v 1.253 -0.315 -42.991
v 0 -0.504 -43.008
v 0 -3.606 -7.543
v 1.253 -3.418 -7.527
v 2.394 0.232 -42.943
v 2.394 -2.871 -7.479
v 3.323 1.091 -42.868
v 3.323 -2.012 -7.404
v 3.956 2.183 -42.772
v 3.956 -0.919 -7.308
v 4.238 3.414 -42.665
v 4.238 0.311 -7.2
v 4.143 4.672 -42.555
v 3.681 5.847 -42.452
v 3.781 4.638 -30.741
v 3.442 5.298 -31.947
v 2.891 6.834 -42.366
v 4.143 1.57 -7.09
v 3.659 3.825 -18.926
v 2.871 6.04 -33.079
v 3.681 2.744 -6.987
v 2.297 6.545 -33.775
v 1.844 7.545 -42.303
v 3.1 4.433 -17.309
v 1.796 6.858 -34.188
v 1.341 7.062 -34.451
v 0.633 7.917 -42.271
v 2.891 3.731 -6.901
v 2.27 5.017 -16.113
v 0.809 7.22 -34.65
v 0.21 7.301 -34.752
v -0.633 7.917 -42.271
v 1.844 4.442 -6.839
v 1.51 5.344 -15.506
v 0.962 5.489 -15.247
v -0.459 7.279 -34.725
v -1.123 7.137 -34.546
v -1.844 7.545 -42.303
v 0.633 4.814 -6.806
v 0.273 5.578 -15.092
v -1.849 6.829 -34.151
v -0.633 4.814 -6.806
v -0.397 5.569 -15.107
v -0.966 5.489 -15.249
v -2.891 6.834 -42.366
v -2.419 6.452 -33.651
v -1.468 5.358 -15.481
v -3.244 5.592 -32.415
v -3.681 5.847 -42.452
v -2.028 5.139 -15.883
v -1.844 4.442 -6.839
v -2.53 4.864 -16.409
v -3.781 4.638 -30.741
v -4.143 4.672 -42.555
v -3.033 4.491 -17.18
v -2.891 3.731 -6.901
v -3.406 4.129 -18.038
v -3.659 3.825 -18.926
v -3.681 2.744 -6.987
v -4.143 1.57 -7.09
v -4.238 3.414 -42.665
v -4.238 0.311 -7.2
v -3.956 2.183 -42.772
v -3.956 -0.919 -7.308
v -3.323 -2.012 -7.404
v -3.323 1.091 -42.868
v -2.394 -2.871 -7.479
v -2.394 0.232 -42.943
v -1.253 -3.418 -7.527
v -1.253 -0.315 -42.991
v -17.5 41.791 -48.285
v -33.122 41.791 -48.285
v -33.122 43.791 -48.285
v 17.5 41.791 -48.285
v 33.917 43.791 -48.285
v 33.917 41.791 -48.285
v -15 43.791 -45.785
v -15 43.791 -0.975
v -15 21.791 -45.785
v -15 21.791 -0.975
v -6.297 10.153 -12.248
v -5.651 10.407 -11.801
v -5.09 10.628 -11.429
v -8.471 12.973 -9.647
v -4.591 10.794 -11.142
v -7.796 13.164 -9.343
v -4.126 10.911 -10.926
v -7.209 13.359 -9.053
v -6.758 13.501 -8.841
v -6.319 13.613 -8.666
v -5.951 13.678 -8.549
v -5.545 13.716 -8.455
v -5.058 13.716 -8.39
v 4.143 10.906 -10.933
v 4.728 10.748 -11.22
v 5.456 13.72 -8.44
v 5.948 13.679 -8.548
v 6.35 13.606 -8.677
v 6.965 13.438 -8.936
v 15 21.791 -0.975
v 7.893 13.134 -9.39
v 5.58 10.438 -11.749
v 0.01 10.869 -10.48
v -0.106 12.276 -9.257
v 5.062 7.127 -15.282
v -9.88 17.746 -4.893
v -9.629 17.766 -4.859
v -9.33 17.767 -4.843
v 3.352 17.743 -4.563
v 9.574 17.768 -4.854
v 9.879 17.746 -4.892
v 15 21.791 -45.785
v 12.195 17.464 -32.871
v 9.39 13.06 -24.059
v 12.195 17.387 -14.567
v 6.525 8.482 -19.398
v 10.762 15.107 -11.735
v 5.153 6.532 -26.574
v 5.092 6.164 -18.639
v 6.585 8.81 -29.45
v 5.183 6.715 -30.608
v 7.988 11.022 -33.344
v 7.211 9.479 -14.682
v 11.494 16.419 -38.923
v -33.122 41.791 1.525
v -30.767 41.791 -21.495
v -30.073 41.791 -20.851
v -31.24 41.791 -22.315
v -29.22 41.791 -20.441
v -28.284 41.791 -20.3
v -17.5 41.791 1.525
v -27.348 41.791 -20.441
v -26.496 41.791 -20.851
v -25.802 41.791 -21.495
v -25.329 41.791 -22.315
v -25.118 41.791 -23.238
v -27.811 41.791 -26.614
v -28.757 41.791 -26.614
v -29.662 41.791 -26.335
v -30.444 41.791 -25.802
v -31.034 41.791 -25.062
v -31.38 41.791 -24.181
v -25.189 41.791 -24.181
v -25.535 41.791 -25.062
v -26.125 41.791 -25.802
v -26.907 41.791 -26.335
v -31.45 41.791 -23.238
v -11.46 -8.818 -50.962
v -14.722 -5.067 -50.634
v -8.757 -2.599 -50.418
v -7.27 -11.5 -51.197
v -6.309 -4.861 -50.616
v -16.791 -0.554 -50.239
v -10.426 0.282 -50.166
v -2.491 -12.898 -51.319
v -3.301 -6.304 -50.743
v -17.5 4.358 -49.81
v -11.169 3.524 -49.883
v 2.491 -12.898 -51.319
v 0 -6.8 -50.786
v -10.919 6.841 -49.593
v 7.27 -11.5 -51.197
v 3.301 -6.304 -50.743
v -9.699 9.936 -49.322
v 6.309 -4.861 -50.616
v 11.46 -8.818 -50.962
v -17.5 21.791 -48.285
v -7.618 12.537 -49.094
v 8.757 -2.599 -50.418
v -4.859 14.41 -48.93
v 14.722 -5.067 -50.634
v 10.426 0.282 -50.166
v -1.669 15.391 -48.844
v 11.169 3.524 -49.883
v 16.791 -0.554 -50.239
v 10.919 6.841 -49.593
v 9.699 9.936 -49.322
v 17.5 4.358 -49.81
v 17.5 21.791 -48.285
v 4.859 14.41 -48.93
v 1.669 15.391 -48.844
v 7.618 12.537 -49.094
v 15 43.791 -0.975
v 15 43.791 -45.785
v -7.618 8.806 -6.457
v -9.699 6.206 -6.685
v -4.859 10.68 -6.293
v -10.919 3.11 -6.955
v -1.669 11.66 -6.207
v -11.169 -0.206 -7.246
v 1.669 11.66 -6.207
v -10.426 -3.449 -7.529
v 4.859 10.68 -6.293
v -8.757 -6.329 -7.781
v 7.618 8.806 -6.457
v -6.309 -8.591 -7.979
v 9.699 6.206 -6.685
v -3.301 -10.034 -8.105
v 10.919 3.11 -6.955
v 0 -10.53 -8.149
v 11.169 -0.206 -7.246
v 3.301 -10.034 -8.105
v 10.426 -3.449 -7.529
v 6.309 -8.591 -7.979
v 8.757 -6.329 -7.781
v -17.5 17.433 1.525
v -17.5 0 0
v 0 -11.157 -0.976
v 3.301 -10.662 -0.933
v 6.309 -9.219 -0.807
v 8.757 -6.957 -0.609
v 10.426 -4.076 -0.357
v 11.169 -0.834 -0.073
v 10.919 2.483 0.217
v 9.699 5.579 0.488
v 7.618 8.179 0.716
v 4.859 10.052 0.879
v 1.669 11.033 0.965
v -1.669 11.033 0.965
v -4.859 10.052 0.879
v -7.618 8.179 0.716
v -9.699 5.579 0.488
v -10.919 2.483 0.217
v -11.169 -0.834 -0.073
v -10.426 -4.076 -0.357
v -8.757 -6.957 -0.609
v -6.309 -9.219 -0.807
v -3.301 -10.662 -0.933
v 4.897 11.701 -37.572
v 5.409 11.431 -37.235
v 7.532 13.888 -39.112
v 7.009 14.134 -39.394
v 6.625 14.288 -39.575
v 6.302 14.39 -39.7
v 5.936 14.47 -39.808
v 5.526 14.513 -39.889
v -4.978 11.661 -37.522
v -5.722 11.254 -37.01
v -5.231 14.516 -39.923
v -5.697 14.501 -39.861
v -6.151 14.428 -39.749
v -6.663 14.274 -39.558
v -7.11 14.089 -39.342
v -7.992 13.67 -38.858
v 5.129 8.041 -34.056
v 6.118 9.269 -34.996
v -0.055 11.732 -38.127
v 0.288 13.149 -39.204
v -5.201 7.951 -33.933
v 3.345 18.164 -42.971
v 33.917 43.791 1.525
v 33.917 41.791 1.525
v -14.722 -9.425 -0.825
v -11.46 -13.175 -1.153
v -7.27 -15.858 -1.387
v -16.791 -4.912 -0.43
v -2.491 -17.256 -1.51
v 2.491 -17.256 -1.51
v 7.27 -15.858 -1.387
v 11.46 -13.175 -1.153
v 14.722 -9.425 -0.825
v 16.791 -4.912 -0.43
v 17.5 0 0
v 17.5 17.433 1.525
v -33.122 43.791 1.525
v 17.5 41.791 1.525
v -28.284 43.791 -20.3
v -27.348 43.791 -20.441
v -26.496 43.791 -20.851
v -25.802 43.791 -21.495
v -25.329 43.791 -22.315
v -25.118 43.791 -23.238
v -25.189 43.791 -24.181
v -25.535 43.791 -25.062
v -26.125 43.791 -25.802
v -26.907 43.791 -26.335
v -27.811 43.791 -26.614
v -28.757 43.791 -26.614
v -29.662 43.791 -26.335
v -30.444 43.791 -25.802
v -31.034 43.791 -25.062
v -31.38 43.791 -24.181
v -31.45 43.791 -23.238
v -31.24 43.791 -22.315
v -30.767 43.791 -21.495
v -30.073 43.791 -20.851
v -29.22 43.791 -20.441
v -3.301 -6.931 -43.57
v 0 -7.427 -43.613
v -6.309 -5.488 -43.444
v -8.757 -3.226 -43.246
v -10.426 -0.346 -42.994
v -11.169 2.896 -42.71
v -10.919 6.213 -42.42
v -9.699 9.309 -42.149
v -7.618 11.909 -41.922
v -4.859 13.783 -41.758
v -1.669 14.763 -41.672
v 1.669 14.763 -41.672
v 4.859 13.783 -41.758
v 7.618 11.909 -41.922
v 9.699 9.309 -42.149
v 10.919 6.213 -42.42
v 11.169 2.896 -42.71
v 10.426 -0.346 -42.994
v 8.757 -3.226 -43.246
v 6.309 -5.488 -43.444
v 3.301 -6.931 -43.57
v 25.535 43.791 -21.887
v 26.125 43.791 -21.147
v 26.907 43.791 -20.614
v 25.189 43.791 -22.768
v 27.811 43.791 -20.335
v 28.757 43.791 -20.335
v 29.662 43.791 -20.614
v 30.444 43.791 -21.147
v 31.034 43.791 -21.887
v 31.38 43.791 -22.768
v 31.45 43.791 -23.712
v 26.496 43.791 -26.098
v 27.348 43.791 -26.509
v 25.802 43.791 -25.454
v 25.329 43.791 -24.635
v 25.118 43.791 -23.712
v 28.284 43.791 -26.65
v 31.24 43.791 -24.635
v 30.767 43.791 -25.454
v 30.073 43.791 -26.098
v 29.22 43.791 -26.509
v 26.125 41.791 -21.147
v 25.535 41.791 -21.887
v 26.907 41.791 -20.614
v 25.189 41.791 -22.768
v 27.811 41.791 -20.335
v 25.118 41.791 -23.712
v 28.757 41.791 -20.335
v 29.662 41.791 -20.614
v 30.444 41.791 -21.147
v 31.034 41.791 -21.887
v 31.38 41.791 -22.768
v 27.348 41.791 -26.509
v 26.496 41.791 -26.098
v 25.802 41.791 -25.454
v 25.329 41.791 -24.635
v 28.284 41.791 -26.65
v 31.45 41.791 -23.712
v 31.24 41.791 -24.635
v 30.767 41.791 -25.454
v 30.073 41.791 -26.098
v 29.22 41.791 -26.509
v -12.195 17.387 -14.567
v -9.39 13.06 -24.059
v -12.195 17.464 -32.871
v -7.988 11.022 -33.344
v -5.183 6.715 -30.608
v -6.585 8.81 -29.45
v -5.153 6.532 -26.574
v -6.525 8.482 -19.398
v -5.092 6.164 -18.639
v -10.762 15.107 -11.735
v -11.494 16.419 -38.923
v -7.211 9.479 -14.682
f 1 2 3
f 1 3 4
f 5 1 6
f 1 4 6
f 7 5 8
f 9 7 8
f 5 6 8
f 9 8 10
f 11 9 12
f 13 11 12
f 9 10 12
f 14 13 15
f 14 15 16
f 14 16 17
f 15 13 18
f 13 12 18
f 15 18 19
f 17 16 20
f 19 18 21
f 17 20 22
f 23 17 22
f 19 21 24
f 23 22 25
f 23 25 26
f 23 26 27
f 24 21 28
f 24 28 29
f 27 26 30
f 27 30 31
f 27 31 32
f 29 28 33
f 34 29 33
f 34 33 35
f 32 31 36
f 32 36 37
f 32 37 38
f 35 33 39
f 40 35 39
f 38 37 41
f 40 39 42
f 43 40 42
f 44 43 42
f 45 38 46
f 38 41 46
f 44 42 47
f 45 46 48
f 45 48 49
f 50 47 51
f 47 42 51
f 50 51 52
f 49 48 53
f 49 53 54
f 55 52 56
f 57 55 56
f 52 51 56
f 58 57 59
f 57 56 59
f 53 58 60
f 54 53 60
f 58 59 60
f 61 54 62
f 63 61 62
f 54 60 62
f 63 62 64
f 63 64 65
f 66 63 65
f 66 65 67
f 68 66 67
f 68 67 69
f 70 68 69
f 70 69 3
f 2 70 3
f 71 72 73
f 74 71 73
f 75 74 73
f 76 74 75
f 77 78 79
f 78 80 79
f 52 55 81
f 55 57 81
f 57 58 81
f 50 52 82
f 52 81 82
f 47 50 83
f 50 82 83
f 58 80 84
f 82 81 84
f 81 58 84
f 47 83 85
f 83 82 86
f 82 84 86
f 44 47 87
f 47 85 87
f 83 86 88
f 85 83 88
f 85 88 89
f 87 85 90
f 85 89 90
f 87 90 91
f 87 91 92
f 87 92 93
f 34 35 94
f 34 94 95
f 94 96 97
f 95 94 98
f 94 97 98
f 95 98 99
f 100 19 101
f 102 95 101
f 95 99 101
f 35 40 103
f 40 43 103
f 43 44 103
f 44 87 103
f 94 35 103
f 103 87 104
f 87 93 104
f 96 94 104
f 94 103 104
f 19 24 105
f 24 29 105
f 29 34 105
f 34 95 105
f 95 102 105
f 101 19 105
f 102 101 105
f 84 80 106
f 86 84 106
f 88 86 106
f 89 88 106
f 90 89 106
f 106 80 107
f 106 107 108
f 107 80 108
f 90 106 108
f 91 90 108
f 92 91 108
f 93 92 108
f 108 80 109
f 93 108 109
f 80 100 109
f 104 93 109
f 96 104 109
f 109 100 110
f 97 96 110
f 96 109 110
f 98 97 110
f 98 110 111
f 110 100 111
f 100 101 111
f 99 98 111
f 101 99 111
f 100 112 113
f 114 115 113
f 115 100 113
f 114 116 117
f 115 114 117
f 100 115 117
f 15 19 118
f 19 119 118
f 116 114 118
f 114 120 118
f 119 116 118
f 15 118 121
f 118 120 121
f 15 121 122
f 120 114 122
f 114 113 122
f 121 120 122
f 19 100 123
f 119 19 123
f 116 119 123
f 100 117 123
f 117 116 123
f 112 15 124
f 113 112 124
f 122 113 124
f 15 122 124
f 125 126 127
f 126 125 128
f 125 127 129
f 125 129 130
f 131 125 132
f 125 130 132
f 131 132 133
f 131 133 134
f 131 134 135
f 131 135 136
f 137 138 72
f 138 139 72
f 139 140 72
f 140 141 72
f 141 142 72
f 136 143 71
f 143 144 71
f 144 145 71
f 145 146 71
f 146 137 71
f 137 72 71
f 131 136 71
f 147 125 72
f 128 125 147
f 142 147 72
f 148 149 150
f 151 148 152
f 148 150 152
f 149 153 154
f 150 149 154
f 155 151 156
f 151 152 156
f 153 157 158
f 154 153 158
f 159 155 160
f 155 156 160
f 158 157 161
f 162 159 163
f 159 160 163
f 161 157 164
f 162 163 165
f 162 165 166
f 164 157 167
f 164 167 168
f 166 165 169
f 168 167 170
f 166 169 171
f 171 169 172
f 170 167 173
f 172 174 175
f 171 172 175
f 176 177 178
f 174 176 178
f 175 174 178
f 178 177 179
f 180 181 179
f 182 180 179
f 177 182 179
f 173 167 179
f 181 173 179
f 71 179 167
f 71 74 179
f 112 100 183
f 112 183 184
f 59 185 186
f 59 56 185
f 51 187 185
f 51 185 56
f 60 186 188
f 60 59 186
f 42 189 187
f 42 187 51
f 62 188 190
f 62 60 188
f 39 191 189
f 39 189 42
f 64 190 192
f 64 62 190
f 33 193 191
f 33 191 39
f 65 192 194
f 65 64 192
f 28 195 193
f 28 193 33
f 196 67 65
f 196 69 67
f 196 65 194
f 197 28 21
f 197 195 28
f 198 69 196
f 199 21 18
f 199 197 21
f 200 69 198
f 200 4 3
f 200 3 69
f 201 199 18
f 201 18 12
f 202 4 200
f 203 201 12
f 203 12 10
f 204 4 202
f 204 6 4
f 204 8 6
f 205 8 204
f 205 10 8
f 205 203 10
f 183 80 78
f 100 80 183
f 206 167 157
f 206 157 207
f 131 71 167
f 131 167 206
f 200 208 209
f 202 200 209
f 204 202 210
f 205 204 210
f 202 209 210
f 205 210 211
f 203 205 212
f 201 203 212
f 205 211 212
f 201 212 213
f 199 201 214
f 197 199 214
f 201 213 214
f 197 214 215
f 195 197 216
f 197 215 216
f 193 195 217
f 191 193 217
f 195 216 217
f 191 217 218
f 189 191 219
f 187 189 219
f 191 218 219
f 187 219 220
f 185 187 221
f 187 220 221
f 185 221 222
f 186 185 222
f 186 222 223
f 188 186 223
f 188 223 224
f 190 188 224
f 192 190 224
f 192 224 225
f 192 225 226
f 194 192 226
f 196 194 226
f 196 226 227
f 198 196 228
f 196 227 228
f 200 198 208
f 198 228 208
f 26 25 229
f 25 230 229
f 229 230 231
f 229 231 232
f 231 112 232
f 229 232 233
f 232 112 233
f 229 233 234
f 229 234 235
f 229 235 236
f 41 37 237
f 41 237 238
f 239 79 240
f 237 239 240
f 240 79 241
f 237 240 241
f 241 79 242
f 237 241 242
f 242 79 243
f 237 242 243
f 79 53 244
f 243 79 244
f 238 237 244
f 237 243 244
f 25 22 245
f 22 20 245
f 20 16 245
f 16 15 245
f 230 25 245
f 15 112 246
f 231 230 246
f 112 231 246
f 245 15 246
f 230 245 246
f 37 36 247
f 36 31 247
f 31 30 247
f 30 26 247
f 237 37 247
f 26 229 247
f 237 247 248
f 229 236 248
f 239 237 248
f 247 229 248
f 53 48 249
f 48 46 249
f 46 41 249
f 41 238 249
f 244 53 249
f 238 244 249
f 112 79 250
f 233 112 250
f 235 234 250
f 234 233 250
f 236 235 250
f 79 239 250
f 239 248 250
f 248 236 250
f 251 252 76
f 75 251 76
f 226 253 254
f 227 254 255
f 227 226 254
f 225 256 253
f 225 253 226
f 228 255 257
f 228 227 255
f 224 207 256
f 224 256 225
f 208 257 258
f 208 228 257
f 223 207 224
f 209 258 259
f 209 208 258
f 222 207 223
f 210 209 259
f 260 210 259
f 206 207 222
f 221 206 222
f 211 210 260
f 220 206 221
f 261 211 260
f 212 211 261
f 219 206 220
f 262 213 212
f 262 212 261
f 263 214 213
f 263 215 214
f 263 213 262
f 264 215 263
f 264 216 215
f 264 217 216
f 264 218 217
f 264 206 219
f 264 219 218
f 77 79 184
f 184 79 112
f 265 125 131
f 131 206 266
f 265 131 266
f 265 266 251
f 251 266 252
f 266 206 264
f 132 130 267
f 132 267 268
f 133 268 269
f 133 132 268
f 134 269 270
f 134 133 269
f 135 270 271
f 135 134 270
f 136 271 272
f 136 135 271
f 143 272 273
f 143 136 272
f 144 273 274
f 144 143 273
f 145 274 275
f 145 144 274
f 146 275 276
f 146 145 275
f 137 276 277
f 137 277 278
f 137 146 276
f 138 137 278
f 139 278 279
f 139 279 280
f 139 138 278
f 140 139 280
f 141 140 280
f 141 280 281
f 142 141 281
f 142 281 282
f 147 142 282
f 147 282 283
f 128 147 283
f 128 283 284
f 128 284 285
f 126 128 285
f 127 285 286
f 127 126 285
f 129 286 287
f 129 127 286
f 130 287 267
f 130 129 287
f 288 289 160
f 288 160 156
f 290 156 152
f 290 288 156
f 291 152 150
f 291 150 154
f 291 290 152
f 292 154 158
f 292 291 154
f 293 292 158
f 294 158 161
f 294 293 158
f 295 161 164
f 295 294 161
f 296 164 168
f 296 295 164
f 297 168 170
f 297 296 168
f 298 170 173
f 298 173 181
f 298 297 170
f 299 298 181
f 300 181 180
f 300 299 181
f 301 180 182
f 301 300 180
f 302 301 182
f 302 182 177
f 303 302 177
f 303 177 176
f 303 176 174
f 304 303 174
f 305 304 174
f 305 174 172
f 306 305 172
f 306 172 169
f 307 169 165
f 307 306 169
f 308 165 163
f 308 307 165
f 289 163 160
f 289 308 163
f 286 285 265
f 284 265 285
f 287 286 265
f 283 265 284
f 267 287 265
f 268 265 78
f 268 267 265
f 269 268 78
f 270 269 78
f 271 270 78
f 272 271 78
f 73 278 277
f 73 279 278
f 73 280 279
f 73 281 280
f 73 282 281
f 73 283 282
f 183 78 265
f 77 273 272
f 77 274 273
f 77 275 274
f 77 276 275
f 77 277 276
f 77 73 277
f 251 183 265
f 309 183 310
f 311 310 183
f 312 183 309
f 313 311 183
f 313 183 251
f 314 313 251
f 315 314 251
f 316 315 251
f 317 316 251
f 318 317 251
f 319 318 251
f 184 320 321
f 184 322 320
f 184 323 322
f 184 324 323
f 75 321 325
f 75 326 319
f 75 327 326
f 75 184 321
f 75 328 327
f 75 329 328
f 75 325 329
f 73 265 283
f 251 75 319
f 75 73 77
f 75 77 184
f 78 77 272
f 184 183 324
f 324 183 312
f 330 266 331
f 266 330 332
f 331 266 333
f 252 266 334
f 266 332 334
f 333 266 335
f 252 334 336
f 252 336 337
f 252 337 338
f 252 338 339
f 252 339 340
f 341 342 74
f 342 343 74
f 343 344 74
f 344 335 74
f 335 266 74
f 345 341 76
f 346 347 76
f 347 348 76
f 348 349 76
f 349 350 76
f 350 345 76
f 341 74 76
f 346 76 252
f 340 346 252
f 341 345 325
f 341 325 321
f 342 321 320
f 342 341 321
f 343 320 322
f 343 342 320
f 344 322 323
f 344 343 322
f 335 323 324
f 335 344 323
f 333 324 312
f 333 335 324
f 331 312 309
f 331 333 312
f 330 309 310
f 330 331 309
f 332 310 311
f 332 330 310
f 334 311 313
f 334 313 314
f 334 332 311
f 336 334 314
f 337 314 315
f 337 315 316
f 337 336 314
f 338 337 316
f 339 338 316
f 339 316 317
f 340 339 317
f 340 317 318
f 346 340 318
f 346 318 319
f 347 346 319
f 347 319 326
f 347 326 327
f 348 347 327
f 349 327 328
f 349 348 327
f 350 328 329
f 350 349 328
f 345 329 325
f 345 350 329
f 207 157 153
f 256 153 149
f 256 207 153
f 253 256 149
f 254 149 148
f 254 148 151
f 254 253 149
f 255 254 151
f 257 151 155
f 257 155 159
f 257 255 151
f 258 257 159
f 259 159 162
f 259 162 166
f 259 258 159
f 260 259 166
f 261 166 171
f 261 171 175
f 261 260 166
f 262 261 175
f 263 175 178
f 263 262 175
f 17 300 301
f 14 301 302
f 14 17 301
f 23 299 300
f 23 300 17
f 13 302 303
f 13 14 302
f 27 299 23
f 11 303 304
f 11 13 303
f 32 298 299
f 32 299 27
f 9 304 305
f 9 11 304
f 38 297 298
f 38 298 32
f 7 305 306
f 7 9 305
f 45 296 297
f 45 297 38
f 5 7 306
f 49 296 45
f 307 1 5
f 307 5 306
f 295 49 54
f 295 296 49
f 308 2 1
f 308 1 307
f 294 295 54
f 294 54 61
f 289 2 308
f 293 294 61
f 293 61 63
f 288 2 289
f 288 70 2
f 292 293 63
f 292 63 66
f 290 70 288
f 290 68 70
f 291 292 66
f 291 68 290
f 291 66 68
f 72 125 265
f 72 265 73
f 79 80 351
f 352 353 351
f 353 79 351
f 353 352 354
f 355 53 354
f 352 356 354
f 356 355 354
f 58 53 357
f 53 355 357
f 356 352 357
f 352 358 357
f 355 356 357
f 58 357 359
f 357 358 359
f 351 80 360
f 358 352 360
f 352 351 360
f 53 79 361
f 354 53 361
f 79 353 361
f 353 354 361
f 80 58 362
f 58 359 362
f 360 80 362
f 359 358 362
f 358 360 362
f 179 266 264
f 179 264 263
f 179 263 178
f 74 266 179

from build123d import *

# Parameters (mm, degrees)
BOSS_EXTRUDE2_DEPTH = 50
SKETCH19_R          = 4.25
CUT_EXTRUDE4_DEPTH  = 59.449844405
SKETCH20_R          = 11.2
CUT_EXTRUDE5_DEPTH  = 7.2
CUT_EXTRUDE6_START  = -7.2
SKETCH21_R          = 11.2
CUT_EXTRUDE6_DEPTH  = 7.2
SKETCH29_W          = 67.039204955
SKETCH29_H          = 49.809734905
SKETCH29_R          = 3.175
SKETCH29_W_2        = 30
SKETCH29_H_2        = 44.809734905
BOSS_EXTRUDE4_DEPTH = 2


with BuildPart() as part:
    # Sketch11 → Boss-Extrude2 (new body)
    with BuildSketch(Plane(origin=(0, 0, 0), x_dir=(-1, 0, 0), z_dir=(0, 0.08715574274765156, -0.9961946980917461))):
        with BuildLine():
            Line((-17.5, 0), (-17.5, 17.5))
            Line((-17.5, 17.5), (17.5, 17.5))
            Line((17.5, 17.5), (17.5, 0))
            ThreePointArc((17.5, 0), (0, -17.5), (-17.5, 0))
        make_face()
    extrude(amount=BOSS_EXTRUDE2_DEPTH)

    # Sketch19 → Cut-Extrude4 (cut, through all)
    with BuildSketch(Plane(origin=(0, 0, 0), x_dir=(1, 0, 0), z_dir=(0, -0.08715574274765156, 0.9961946980917461))):
        with Locations(Location((0, 0, 0), (0, 0, 270))):
            Circle(SKETCH19_R)
    extrude(amount=-CUT_EXTRUDE4_DEPTH, mode=Mode.SUBTRACT)

    # Sketch20 → Cut-Extrude5 (cut)
    with BuildSketch(Plane(origin=(0, 0, 0), x_dir=(1, 0, 0), z_dir=(0, -0.08715574274765156, 0.9961946980917461))):
        with Locations(Location((0, 0, 0), (0, 0, 270))):
            Circle(SKETCH20_R)
    extrude(amount=-CUT_EXTRUDE5_DEPTH, mode=Mode.SUBTRACT)

    # Sketch21 → Cut-Extrude6 (cut)
    with BuildSketch(Plane(origin=(0, 4.357787137, -49.809734905), x_dir=(-1, 0, 0), z_dir=(0, 0.08715574274765156, -0.9961946980917461)).offset(CUT_EXTRUDE6_START)):
        with Locations(Location((0, 0, 0), (0, 0, 270))):
            Circle(SKETCH21_R)
    extrude(amount=CUT_EXTRUDE6_DEPTH, mode=Mode.SUBTRACT)

    # Sketch23 → Loft3 section 0
    with BuildSketch(Plane(origin=(0, 17.433407217, 1.525225498), x_dir=(1, 0, 0), z_dir=(0, 0.9961946980917462, 0.08715574274765159))):
        with BuildLine():
            Line((17.5, 0), (17.5, 50))
            Line((17.5, 50), (-17.5, 50))
            Line((-17.5, 50), (-17.5, 0))
            Line((-17.5, 0), (17.5, 0))
        make_face()
    # Sketch24 → Loft3 section 1
    with BuildSketch(Plane(origin=(0, 41.791194354, 0), x_dir=(1, 0, 0), z_dir=(0, 1, 0))):
        with BuildLine():
            Line((17.5, -1.525225498), (17.5, 48.284509407))
            Line((17.5, 48.284509407), (-17.5, 48.284509407))
            Line((-17.5, 48.284509407), (-17.5, -1.525225498))
            Line((-17.5, -1.525225498), (17.5, -1.525225498))
        make_face()
    loft()

    # Sketch26 → Cut-Loft7 section 0
    with BuildSketch(Plane(origin=(0, 41.791194354, 0), x_dir=(1, 0, 0), z_dir=(0, 1, 0))):
        with BuildLine():
            Line((-15, 0.974774502), (15, 0.974774502))
            Line((15, 0.974774502), (15, 45.784509407))
            Line((15, 45.784509407), (-15, 45.784509407))
            Line((-15, 45.784509407), (-15, 0.974774502))
        make_face()
    # Sketch27 → Cut-Loft7 section 1
    with BuildSketch(Plane(origin=(0, 21.791194354, 0), x_dir=(1, 0, 0), z_dir=(0, 1, 0))):
        with BuildLine():
            Line((15, 0.974774502), (15, 45.784509407))
            Line((15, 45.784509407), (-15, 45.784509407))
            Line((-15, 45.784509407), (-15, 0.974774502))
            Line((-15, 0.974774502), (15, 0.974774502))
        make_face()
    loft(mode=Mode.SUBTRACT)

    # Cut-Loft8: read off the stored shape, not the designer's step
    # Cut-Loft8: loft between two sections, ruled curve by curve
    cut_loft8_from = [
        Edge.make_bspline([(2.4, 2.52751654, -28.889646245), (2.4, 2.544947688, -29.088885184), (2.37568, 2.564665803, -29.314264273), (2.23232, 2.607504594, -29.803913891), (2.112, 2.630708939, -30.069140767), (1.728, 2.675332679, -30.579192453), (1.461591696, 2.696640901, -30.822746545), (0.963321799, 2.719802012, -31.087479253), (0.781633136, 2.726029473, -31.158659456), (0.399905325, 2.734478939, -31.25523729), (0.2, 2.736690322, -31.28051352), (-0.2, 2.736690322, -31.28051352), (-0.399905325, 2.734478939, -31.25523729), (-0.781633136, 2.726029473, -31.158659456), (-0.963321799, 2.719802012, -31.087479253), (-1.461591696, 2.696640901, -30.822746545), (-1.728, 2.675332679, -30.579192453), (-2.112, 2.630708939, -30.069140767), (-2.23232, 2.607504594, -29.803913891), (-2.37568, 2.564665803, -29.314264273), (-2.4, 2.544947688, -29.088885184), (-2.4, 2.52751654, -28.889646245)], [0, 0, 0, 0, 0.125, 0.125, 0.25, 0.25, 0.375, 0.375, 0.4375, 0.4375, 0.5, 0.5, 0.5625, 0.5625, 0.625, 0.625, 0.75, 0.75, 0.875, 0.875, 1, 1, 1, 1], 3),
        Edge.make_bspline([(-2.4, 2.52751654, -28.889646245), (-2.4, 2.411308883, -27.561386647), (-2.4, 2.295101226, -26.23312705), (-2.4, 2.062685912, -23.576607855), (-2.4, 1.946478255, -22.248348257), (-2.4, 1.830270598, -20.92008866)], [0, 0, 0, 0, 0.5, 0.5, 1, 1, 1, 1], 3),
        Edge.make_bspline([(2.4, 1.830270598, -20.92008866), (2.4, 1.946478255, -22.248348257), (2.4, 2.062685912, -23.576607855), (2.4, 2.295101226, -26.23312705), (2.4, 2.411308883, -27.561386647), (2.4, 2.52751654, -28.889646245)], [0, 0, 0, 0, 0.5, 0.5, 1, 1, 1, 1], 3),
        Edge.make_bspline([(-2.4, 1.830270598, -20.92008866), (-2.4, 1.812839449, -20.72084972), (-2.37568, 1.793121334, -20.495470632), (-2.23232, 1.750282543, -20.005821014), (-2.112, 1.727078198, -19.740594137), (-1.728, 1.682454458, -19.230542452), (-1.461591696, 1.661146236, -18.98698836), (-0.963321799, 1.637985125, -18.722255651), (-0.781633136, 1.631757664, -18.651075448), (-0.399905325, 1.623308199, -18.554497614), (-0.2, 1.621096815, -18.529221385), (0.2, 1.621096815, -18.529221385), (0.399905325, 1.623308199, -18.554497614), (0.781633136, 1.631757664, -18.651075448), (0.963321799, 1.637985125, -18.722255651), (1.461591696, 1.661146236, -18.98698836), (1.728, 1.682454458, -19.230542452), (2.112, 1.727078198, -19.740594137), (2.23232, 1.750282543, -20.005821014), (2.37568, 1.793121334, -20.495470632), (2.4, 1.812839449, -20.72084972), (2.4, 1.830270598, -20.92008866)], [0, 0, 0, 0, 0.125, 0.125, 0.25, 0.25, 0.375, 0.375, 0.4375, 0.4375, 0.5, 0.5, 0.5625, 0.5625, 0.625, 0.625, 0.75, 0.75, 0.875, 0.875, 1, 1, 1, 1], 3),
    ]
    cut_loft8_to = [
        Edge.make_bspline([(15, 21.791194354, -45.784509407), (13.75, 21.791194354, -45.784509407), (12.5, 21.791194354, -45.784509407), (10, 21.791194354, -45.784509407), (8.75, 21.791194354, -45.784509407), (6.25, 21.791194354, -45.784509407), (5, 21.791194354, -45.784509407), (3.125, 21.791194354, -45.784509407), (2.5, 21.791194354, -45.784509407), (1.25, 21.791194354, -45.784509407), (0.625, 21.791194354, -45.784509407), (-0.625, 21.791194354, -45.784509407), (-1.25, 21.791194354, -45.784509407), (-2.5, 21.791194354, -45.784509407), (-3.125, 21.791194354, -45.784509407), (-5, 21.791194354, -45.784509407), (-6.25, 21.791194354, -45.784509407), (-8.75, 21.791194354, -45.784509407), (-10, 21.791194354, -45.784509407), (-12.5, 21.791194354, -45.784509407), (-13.75, 21.791194354, -45.784509407), (-15, 21.791194354, -45.784509407)], [0, 0, 0, 0, 0.125, 0.125, 0.25, 0.25, 0.375, 0.375, 0.4375, 0.4375, 0.5, 0.5, 0.5625, 0.5625, 0.625, 0.625, 0.75, 0.75, 0.875, 0.875, 1, 1, 1, 1], 3),
        Edge.make_bspline([(-15, 21.791194354, -45.784509407), (-15, 21.791194354, -38.316220256), (-15, 21.791194354, -30.847931105), (-15, 21.791194354, -15.911352803), (-15, 21.791194354, -8.443063653), (-15, 21.791194354, -0.974774502)], [0, 0, 0, 0, 0.5, 0.5, 1, 1, 1, 1], 3),
        Edge.make_bspline([(15, 21.791194354, -0.974774502), (15, 21.791194354, -8.443063653), (15, 21.791194354, -15.911352803), (15, 21.791194354, -30.847931105), (15, 21.791194354, -38.316220256), (15, 21.791194354, -45.784509407)], [0, 0, 0, 0, 0.5, 0.5, 1, 1, 1, 1], 3),
        Edge.make_bspline([(-15, 21.791194354, -0.974774502), (-13.75, 21.791194354, -0.974774502), (-12.5, 21.791194354, -0.974774502), (-10, 21.791194354, -0.974774502), (-8.75, 21.791194354, -0.974774502), (-6.25, 21.791194354, -0.974774502), (-5, 21.791194354, -0.974774502), (-3.125, 21.791194354, -0.974774502), (-2.5, 21.791194354, -0.974774502), (-1.25, 21.791194354, -0.974774502), (-0.625, 21.791194354, -0.974774502), (0.625, 21.791194354, -0.974774502), (1.25, 21.791194354, -0.974774502), (2.5, 21.791194354, -0.974774502), (3.125, 21.791194354, -0.974774502), (5, 21.791194354, -0.974774502), (6.25, 21.791194354, -0.974774502), (8.75, 21.791194354, -0.974774502), (10, 21.791194354, -0.974774502), (12.5, 21.791194354, -0.974774502), (13.75, 21.791194354, -0.974774502), (15, 21.791194354, -0.974774502)], [0, 0, 0, 0, 0.125, 0.125, 0.25, 0.25, 0.375, 0.375, 0.4375, 0.4375, 0.5, 0.5, 0.5625, 0.5625, 0.625, 0.625, 0.75, 0.75, 0.875, 0.875, 1, 1, 1, 1], 3),
    ]
    cut_loft8 = Solid(Shell([*[Face.make_surface_from_curves(cut_loft8_from[k], cut_loft8_to[k]) for k in range(4)], Face(Wire(cut_loft8_from)), Face(Wire(cut_loft8_to))]))
    add(cut_loft8, mode=Mode.SUBTRACT)

    # Sketch29 → Boss-Extrude4 (add)
    with BuildSketch(Plane(origin=(0, 41.791194354, 0), x_dir=(1, 0, 0), z_dir=(0, 1, 0))):
        with Locations((0.397406033, 23.379641955)):
            Rectangle(SKETCH29_W, SKETCH29_H)
        with Locations(Location((-28.284271247, 23.474774502, 0), (0, 0, 270))):
            Circle(SKETCH29_R, mode=Mode.SUBTRACT)
        with Locations(Location((28.284271247, 23.474774502, 0), (0, 0, 90))):
            Circle(SKETCH29_R, mode=Mode.SUBTRACT)
        with Locations((0, 23.379641955)):
            Rectangle(SKETCH29_W_2, SKETCH29_H_2, mode=Mode.SUBTRACT)
    extrude(amount=BOSS_EXTRUDE4_DEPTH)


solid = part.part
